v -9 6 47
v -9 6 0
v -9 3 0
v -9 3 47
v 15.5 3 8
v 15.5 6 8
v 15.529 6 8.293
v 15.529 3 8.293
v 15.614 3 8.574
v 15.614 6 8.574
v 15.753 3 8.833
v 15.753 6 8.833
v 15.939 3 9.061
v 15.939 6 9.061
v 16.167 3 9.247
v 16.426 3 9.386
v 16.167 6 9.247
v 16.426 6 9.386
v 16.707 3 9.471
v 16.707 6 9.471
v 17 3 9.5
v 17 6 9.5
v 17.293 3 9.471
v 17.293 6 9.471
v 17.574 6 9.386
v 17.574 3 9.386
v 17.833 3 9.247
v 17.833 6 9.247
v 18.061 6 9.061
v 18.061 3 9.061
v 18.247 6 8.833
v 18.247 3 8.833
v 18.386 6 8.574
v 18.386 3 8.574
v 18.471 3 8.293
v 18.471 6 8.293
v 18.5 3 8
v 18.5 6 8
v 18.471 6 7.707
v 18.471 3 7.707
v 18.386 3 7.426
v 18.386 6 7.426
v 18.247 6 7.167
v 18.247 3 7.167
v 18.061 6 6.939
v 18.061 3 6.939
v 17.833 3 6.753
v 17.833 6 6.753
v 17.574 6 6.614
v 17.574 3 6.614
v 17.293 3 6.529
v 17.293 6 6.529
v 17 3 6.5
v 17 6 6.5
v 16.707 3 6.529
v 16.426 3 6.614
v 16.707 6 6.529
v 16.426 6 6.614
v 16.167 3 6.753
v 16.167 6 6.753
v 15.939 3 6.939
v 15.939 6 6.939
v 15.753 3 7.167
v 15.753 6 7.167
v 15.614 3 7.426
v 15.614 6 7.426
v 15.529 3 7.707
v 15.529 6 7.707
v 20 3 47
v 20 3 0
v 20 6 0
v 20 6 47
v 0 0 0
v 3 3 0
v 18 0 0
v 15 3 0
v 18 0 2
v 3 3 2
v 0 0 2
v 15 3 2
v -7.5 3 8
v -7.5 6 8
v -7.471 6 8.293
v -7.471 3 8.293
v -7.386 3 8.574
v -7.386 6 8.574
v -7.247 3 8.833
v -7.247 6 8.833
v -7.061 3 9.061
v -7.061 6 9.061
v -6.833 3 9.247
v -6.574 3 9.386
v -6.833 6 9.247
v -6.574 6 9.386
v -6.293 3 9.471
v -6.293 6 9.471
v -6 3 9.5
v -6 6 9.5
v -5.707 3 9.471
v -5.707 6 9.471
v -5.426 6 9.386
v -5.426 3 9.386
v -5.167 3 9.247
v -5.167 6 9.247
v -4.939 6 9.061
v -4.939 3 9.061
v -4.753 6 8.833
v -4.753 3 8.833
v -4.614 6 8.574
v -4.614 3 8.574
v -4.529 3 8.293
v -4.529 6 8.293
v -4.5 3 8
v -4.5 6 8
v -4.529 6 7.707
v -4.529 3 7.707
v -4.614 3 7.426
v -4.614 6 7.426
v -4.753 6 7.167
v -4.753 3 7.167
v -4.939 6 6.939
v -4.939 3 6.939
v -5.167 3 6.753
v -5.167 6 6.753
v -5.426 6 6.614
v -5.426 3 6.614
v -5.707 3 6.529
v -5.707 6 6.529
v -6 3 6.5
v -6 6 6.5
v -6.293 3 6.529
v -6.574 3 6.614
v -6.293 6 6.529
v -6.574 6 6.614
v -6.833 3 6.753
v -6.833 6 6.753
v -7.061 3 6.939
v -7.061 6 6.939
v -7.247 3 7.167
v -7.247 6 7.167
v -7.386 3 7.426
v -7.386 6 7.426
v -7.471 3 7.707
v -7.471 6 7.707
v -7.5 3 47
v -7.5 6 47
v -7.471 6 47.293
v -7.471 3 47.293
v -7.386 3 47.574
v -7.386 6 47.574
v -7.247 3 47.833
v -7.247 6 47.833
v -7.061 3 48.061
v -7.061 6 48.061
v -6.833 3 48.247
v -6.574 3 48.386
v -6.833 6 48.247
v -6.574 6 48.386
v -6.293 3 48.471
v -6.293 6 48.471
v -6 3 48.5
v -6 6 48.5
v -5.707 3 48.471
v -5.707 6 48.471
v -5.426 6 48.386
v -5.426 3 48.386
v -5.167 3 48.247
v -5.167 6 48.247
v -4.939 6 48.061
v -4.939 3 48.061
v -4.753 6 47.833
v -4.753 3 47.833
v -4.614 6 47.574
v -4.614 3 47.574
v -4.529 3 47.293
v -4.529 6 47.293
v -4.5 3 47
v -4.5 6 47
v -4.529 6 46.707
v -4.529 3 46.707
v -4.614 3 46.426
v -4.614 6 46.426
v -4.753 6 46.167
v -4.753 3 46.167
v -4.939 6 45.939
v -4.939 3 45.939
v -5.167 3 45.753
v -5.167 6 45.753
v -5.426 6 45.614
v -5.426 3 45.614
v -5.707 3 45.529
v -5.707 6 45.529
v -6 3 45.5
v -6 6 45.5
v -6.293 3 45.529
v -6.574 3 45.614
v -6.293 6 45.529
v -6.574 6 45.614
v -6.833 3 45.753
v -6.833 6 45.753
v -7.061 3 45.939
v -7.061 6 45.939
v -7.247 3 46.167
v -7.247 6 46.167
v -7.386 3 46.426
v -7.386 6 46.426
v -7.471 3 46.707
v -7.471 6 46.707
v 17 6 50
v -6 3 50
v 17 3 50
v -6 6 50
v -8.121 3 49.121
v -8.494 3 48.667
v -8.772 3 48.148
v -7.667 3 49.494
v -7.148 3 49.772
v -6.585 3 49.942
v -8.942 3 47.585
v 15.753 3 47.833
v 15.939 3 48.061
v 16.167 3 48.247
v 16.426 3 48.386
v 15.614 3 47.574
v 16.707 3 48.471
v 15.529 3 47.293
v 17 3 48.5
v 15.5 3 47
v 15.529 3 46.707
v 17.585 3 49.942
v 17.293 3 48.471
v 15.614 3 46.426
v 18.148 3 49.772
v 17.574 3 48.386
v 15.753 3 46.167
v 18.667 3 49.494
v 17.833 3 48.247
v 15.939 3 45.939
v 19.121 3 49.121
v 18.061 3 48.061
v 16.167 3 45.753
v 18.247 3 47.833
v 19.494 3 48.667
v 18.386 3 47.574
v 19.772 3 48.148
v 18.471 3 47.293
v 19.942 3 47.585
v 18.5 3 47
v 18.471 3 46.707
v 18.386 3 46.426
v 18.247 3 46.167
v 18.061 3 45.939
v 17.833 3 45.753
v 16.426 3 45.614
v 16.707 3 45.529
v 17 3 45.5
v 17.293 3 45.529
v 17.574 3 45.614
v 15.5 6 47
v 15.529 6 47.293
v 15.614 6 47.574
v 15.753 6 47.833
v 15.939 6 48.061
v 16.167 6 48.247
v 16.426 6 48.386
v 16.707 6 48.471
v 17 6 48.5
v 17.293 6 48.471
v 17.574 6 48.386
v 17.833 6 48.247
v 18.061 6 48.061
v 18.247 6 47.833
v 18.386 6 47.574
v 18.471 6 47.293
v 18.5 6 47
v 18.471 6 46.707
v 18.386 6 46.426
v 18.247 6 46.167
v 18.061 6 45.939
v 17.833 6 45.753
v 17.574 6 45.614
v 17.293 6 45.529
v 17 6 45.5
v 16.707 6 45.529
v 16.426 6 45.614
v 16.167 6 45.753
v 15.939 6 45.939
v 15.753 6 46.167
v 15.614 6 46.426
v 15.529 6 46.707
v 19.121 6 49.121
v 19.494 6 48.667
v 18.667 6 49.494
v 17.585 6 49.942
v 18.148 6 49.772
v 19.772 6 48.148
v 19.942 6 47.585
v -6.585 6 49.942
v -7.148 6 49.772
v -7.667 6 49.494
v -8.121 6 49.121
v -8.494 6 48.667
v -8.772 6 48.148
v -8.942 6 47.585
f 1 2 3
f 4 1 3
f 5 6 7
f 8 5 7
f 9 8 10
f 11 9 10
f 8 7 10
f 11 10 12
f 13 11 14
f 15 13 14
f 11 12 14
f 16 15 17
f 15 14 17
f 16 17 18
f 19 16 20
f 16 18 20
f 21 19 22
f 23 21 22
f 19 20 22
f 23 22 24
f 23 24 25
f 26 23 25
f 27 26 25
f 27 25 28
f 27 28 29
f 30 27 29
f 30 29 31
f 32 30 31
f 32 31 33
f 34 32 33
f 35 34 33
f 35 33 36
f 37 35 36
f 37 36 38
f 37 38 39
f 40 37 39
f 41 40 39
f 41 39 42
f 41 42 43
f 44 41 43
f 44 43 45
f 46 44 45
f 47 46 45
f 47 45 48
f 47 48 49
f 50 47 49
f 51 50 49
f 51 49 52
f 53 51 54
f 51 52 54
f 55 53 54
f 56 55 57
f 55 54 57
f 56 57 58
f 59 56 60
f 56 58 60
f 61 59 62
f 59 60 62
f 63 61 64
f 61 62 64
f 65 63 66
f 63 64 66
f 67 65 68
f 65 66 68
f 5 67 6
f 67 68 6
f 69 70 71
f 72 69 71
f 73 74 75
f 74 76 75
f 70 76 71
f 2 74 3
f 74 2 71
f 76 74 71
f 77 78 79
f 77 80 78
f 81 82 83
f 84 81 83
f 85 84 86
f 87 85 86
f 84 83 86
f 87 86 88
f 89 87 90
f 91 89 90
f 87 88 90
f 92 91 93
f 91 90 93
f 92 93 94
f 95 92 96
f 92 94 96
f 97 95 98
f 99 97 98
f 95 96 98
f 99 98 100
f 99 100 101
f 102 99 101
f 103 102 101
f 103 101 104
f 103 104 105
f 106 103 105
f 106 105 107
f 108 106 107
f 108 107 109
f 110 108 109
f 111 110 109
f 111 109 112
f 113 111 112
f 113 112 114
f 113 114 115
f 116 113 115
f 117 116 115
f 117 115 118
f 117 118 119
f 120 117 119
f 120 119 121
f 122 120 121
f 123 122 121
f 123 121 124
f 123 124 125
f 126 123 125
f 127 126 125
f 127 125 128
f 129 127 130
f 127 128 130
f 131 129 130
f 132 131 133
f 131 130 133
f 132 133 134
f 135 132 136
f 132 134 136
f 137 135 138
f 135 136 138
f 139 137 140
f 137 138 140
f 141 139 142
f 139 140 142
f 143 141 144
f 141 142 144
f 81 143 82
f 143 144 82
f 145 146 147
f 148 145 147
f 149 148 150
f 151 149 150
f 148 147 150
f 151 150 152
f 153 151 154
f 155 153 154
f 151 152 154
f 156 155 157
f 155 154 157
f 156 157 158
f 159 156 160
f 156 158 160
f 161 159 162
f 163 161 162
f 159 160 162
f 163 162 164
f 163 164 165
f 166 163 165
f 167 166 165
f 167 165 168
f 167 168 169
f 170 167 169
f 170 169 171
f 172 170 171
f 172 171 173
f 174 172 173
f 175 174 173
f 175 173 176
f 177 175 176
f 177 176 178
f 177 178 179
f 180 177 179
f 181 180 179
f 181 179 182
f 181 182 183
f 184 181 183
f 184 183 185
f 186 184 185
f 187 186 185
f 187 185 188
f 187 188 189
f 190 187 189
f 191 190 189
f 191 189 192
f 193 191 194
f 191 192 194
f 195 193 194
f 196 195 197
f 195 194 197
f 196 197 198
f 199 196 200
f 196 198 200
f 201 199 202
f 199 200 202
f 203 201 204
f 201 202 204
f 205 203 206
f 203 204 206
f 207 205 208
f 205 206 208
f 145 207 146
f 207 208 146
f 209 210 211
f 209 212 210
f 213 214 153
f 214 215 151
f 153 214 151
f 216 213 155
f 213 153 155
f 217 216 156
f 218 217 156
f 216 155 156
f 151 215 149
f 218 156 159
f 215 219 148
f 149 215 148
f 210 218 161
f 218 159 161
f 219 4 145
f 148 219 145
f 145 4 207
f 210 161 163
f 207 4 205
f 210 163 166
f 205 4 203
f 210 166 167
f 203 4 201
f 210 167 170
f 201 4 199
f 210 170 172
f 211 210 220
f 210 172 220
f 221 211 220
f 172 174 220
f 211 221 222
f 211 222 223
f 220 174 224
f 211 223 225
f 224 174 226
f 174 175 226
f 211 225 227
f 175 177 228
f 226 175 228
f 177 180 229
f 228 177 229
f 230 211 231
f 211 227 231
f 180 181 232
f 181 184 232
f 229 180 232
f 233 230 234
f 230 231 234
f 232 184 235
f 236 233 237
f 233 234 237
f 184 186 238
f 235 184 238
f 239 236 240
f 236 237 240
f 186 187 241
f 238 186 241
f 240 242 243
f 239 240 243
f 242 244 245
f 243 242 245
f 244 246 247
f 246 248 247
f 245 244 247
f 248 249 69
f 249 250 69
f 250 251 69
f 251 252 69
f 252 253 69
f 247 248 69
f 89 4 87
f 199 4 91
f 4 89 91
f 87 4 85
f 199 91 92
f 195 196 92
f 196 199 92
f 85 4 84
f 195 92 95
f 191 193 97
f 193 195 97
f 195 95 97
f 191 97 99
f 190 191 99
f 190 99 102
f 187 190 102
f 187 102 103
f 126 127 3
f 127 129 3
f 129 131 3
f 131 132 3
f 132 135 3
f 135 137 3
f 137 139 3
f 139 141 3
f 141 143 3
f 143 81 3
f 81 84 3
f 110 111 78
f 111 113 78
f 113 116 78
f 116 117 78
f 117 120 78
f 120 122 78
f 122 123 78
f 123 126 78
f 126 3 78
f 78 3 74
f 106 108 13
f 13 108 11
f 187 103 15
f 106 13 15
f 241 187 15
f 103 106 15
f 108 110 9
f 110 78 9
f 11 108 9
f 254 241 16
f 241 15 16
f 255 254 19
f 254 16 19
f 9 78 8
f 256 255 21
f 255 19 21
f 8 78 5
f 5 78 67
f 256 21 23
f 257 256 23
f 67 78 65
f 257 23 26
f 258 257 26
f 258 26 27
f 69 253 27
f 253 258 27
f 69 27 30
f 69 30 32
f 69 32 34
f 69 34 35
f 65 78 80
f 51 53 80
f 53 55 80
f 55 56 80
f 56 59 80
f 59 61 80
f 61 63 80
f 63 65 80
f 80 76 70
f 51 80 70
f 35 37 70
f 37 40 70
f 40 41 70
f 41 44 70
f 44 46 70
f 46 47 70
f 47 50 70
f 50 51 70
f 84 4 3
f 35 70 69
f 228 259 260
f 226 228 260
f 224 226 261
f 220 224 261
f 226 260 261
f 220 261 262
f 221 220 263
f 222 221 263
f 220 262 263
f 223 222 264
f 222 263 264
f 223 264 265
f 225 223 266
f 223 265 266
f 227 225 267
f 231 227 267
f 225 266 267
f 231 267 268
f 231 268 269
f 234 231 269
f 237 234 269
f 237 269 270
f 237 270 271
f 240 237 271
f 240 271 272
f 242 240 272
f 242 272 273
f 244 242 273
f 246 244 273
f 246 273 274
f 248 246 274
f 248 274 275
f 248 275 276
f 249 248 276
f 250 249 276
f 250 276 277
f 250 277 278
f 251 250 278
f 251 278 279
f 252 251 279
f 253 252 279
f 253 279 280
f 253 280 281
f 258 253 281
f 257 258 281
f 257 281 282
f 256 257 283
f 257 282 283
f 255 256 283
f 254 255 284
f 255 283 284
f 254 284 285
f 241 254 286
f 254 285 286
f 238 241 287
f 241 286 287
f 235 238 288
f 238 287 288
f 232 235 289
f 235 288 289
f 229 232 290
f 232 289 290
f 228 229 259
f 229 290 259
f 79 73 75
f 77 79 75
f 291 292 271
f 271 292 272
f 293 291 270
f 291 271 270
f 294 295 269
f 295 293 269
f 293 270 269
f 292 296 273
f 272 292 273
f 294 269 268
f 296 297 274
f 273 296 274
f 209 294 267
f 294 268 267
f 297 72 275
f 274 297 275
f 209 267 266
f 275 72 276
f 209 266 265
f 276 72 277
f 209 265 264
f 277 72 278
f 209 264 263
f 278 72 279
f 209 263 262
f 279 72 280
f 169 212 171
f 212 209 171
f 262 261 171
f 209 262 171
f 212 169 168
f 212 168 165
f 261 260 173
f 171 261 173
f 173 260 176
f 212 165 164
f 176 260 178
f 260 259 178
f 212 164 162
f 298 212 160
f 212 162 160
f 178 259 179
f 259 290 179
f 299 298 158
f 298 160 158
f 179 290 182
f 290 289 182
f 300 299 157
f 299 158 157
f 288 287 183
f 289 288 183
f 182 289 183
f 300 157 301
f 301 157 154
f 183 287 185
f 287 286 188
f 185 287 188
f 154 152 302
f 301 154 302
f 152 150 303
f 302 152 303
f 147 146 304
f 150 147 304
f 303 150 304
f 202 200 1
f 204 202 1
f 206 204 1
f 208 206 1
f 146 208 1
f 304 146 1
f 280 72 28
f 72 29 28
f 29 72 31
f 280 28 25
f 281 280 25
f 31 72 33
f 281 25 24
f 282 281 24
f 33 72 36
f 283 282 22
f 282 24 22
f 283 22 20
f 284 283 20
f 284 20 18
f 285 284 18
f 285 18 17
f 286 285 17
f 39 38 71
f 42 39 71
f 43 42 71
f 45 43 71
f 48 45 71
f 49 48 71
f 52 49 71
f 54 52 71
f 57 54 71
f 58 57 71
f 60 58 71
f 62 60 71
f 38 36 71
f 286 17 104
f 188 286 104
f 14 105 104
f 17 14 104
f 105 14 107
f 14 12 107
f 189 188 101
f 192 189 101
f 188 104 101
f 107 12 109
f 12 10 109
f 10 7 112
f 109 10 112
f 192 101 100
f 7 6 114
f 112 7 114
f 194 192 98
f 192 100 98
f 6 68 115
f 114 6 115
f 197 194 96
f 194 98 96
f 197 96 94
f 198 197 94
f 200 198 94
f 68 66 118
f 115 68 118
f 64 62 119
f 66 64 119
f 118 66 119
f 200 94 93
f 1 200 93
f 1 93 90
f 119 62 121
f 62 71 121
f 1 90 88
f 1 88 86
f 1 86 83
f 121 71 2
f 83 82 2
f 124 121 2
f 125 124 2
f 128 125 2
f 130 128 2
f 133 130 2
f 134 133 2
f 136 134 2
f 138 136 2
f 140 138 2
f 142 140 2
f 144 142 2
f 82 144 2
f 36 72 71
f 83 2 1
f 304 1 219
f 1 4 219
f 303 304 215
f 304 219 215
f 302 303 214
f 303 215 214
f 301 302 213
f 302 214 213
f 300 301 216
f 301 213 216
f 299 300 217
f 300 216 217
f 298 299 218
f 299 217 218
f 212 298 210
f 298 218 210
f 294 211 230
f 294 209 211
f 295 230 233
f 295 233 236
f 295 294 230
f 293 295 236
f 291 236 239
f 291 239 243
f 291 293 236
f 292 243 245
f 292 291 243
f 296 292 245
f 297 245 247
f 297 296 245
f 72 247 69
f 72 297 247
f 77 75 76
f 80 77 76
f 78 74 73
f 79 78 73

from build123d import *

# Parameters (mm, degrees)
F1_DEPTH = 2
F2_DEPTH = 50
F3_R     = 1.5
F4_DEPTH = 25
F5_R     = 3


with BuildPart() as f1:
    # F0 (on Top) → F1 (new body)
    with BuildSketch(Plane.XY):
        Polygon((3, 3), (0, 0), (18, 0), (15, 3), align=None)
    extrude(amount=F1_DEPTH)

    # F0 (on Top) → F2 (join)
    with BuildSketch(Plane.XY):
        Polygon((-9, 3), (3, 3), (15, 3), (20, 3), (20, 6), (-9, 6), align=None)
    extrude(amount=F2_DEPTH)

    # F3 (on face) → F4 (cut)
    with BuildSketch(Plane(origin=(0, 6, 0), x_dir=(-1, 0, 0), z_dir=(0, 1, 0))):
        with Locations((6, 8)):
            Circle(F3_R)
        with Locations((-17, 8)):
            Circle(F3_R)
        with Locations((-17, 47)):
            Circle(F3_R)
        with Locations((6, 47)):
            Circle(F3_R)
    extrude(amount=-F4_DEPTH, mode=Mode.SUBTRACT)

    # F5
    f5_edges = [f1.edges().sort_by_distance(p)[0] for p in [
        (-9, 4.5, 50),
        (20, 4.5, 50),
    ]]
    fillet(f5_edges, radius=F5_R)


solid = f1.part
